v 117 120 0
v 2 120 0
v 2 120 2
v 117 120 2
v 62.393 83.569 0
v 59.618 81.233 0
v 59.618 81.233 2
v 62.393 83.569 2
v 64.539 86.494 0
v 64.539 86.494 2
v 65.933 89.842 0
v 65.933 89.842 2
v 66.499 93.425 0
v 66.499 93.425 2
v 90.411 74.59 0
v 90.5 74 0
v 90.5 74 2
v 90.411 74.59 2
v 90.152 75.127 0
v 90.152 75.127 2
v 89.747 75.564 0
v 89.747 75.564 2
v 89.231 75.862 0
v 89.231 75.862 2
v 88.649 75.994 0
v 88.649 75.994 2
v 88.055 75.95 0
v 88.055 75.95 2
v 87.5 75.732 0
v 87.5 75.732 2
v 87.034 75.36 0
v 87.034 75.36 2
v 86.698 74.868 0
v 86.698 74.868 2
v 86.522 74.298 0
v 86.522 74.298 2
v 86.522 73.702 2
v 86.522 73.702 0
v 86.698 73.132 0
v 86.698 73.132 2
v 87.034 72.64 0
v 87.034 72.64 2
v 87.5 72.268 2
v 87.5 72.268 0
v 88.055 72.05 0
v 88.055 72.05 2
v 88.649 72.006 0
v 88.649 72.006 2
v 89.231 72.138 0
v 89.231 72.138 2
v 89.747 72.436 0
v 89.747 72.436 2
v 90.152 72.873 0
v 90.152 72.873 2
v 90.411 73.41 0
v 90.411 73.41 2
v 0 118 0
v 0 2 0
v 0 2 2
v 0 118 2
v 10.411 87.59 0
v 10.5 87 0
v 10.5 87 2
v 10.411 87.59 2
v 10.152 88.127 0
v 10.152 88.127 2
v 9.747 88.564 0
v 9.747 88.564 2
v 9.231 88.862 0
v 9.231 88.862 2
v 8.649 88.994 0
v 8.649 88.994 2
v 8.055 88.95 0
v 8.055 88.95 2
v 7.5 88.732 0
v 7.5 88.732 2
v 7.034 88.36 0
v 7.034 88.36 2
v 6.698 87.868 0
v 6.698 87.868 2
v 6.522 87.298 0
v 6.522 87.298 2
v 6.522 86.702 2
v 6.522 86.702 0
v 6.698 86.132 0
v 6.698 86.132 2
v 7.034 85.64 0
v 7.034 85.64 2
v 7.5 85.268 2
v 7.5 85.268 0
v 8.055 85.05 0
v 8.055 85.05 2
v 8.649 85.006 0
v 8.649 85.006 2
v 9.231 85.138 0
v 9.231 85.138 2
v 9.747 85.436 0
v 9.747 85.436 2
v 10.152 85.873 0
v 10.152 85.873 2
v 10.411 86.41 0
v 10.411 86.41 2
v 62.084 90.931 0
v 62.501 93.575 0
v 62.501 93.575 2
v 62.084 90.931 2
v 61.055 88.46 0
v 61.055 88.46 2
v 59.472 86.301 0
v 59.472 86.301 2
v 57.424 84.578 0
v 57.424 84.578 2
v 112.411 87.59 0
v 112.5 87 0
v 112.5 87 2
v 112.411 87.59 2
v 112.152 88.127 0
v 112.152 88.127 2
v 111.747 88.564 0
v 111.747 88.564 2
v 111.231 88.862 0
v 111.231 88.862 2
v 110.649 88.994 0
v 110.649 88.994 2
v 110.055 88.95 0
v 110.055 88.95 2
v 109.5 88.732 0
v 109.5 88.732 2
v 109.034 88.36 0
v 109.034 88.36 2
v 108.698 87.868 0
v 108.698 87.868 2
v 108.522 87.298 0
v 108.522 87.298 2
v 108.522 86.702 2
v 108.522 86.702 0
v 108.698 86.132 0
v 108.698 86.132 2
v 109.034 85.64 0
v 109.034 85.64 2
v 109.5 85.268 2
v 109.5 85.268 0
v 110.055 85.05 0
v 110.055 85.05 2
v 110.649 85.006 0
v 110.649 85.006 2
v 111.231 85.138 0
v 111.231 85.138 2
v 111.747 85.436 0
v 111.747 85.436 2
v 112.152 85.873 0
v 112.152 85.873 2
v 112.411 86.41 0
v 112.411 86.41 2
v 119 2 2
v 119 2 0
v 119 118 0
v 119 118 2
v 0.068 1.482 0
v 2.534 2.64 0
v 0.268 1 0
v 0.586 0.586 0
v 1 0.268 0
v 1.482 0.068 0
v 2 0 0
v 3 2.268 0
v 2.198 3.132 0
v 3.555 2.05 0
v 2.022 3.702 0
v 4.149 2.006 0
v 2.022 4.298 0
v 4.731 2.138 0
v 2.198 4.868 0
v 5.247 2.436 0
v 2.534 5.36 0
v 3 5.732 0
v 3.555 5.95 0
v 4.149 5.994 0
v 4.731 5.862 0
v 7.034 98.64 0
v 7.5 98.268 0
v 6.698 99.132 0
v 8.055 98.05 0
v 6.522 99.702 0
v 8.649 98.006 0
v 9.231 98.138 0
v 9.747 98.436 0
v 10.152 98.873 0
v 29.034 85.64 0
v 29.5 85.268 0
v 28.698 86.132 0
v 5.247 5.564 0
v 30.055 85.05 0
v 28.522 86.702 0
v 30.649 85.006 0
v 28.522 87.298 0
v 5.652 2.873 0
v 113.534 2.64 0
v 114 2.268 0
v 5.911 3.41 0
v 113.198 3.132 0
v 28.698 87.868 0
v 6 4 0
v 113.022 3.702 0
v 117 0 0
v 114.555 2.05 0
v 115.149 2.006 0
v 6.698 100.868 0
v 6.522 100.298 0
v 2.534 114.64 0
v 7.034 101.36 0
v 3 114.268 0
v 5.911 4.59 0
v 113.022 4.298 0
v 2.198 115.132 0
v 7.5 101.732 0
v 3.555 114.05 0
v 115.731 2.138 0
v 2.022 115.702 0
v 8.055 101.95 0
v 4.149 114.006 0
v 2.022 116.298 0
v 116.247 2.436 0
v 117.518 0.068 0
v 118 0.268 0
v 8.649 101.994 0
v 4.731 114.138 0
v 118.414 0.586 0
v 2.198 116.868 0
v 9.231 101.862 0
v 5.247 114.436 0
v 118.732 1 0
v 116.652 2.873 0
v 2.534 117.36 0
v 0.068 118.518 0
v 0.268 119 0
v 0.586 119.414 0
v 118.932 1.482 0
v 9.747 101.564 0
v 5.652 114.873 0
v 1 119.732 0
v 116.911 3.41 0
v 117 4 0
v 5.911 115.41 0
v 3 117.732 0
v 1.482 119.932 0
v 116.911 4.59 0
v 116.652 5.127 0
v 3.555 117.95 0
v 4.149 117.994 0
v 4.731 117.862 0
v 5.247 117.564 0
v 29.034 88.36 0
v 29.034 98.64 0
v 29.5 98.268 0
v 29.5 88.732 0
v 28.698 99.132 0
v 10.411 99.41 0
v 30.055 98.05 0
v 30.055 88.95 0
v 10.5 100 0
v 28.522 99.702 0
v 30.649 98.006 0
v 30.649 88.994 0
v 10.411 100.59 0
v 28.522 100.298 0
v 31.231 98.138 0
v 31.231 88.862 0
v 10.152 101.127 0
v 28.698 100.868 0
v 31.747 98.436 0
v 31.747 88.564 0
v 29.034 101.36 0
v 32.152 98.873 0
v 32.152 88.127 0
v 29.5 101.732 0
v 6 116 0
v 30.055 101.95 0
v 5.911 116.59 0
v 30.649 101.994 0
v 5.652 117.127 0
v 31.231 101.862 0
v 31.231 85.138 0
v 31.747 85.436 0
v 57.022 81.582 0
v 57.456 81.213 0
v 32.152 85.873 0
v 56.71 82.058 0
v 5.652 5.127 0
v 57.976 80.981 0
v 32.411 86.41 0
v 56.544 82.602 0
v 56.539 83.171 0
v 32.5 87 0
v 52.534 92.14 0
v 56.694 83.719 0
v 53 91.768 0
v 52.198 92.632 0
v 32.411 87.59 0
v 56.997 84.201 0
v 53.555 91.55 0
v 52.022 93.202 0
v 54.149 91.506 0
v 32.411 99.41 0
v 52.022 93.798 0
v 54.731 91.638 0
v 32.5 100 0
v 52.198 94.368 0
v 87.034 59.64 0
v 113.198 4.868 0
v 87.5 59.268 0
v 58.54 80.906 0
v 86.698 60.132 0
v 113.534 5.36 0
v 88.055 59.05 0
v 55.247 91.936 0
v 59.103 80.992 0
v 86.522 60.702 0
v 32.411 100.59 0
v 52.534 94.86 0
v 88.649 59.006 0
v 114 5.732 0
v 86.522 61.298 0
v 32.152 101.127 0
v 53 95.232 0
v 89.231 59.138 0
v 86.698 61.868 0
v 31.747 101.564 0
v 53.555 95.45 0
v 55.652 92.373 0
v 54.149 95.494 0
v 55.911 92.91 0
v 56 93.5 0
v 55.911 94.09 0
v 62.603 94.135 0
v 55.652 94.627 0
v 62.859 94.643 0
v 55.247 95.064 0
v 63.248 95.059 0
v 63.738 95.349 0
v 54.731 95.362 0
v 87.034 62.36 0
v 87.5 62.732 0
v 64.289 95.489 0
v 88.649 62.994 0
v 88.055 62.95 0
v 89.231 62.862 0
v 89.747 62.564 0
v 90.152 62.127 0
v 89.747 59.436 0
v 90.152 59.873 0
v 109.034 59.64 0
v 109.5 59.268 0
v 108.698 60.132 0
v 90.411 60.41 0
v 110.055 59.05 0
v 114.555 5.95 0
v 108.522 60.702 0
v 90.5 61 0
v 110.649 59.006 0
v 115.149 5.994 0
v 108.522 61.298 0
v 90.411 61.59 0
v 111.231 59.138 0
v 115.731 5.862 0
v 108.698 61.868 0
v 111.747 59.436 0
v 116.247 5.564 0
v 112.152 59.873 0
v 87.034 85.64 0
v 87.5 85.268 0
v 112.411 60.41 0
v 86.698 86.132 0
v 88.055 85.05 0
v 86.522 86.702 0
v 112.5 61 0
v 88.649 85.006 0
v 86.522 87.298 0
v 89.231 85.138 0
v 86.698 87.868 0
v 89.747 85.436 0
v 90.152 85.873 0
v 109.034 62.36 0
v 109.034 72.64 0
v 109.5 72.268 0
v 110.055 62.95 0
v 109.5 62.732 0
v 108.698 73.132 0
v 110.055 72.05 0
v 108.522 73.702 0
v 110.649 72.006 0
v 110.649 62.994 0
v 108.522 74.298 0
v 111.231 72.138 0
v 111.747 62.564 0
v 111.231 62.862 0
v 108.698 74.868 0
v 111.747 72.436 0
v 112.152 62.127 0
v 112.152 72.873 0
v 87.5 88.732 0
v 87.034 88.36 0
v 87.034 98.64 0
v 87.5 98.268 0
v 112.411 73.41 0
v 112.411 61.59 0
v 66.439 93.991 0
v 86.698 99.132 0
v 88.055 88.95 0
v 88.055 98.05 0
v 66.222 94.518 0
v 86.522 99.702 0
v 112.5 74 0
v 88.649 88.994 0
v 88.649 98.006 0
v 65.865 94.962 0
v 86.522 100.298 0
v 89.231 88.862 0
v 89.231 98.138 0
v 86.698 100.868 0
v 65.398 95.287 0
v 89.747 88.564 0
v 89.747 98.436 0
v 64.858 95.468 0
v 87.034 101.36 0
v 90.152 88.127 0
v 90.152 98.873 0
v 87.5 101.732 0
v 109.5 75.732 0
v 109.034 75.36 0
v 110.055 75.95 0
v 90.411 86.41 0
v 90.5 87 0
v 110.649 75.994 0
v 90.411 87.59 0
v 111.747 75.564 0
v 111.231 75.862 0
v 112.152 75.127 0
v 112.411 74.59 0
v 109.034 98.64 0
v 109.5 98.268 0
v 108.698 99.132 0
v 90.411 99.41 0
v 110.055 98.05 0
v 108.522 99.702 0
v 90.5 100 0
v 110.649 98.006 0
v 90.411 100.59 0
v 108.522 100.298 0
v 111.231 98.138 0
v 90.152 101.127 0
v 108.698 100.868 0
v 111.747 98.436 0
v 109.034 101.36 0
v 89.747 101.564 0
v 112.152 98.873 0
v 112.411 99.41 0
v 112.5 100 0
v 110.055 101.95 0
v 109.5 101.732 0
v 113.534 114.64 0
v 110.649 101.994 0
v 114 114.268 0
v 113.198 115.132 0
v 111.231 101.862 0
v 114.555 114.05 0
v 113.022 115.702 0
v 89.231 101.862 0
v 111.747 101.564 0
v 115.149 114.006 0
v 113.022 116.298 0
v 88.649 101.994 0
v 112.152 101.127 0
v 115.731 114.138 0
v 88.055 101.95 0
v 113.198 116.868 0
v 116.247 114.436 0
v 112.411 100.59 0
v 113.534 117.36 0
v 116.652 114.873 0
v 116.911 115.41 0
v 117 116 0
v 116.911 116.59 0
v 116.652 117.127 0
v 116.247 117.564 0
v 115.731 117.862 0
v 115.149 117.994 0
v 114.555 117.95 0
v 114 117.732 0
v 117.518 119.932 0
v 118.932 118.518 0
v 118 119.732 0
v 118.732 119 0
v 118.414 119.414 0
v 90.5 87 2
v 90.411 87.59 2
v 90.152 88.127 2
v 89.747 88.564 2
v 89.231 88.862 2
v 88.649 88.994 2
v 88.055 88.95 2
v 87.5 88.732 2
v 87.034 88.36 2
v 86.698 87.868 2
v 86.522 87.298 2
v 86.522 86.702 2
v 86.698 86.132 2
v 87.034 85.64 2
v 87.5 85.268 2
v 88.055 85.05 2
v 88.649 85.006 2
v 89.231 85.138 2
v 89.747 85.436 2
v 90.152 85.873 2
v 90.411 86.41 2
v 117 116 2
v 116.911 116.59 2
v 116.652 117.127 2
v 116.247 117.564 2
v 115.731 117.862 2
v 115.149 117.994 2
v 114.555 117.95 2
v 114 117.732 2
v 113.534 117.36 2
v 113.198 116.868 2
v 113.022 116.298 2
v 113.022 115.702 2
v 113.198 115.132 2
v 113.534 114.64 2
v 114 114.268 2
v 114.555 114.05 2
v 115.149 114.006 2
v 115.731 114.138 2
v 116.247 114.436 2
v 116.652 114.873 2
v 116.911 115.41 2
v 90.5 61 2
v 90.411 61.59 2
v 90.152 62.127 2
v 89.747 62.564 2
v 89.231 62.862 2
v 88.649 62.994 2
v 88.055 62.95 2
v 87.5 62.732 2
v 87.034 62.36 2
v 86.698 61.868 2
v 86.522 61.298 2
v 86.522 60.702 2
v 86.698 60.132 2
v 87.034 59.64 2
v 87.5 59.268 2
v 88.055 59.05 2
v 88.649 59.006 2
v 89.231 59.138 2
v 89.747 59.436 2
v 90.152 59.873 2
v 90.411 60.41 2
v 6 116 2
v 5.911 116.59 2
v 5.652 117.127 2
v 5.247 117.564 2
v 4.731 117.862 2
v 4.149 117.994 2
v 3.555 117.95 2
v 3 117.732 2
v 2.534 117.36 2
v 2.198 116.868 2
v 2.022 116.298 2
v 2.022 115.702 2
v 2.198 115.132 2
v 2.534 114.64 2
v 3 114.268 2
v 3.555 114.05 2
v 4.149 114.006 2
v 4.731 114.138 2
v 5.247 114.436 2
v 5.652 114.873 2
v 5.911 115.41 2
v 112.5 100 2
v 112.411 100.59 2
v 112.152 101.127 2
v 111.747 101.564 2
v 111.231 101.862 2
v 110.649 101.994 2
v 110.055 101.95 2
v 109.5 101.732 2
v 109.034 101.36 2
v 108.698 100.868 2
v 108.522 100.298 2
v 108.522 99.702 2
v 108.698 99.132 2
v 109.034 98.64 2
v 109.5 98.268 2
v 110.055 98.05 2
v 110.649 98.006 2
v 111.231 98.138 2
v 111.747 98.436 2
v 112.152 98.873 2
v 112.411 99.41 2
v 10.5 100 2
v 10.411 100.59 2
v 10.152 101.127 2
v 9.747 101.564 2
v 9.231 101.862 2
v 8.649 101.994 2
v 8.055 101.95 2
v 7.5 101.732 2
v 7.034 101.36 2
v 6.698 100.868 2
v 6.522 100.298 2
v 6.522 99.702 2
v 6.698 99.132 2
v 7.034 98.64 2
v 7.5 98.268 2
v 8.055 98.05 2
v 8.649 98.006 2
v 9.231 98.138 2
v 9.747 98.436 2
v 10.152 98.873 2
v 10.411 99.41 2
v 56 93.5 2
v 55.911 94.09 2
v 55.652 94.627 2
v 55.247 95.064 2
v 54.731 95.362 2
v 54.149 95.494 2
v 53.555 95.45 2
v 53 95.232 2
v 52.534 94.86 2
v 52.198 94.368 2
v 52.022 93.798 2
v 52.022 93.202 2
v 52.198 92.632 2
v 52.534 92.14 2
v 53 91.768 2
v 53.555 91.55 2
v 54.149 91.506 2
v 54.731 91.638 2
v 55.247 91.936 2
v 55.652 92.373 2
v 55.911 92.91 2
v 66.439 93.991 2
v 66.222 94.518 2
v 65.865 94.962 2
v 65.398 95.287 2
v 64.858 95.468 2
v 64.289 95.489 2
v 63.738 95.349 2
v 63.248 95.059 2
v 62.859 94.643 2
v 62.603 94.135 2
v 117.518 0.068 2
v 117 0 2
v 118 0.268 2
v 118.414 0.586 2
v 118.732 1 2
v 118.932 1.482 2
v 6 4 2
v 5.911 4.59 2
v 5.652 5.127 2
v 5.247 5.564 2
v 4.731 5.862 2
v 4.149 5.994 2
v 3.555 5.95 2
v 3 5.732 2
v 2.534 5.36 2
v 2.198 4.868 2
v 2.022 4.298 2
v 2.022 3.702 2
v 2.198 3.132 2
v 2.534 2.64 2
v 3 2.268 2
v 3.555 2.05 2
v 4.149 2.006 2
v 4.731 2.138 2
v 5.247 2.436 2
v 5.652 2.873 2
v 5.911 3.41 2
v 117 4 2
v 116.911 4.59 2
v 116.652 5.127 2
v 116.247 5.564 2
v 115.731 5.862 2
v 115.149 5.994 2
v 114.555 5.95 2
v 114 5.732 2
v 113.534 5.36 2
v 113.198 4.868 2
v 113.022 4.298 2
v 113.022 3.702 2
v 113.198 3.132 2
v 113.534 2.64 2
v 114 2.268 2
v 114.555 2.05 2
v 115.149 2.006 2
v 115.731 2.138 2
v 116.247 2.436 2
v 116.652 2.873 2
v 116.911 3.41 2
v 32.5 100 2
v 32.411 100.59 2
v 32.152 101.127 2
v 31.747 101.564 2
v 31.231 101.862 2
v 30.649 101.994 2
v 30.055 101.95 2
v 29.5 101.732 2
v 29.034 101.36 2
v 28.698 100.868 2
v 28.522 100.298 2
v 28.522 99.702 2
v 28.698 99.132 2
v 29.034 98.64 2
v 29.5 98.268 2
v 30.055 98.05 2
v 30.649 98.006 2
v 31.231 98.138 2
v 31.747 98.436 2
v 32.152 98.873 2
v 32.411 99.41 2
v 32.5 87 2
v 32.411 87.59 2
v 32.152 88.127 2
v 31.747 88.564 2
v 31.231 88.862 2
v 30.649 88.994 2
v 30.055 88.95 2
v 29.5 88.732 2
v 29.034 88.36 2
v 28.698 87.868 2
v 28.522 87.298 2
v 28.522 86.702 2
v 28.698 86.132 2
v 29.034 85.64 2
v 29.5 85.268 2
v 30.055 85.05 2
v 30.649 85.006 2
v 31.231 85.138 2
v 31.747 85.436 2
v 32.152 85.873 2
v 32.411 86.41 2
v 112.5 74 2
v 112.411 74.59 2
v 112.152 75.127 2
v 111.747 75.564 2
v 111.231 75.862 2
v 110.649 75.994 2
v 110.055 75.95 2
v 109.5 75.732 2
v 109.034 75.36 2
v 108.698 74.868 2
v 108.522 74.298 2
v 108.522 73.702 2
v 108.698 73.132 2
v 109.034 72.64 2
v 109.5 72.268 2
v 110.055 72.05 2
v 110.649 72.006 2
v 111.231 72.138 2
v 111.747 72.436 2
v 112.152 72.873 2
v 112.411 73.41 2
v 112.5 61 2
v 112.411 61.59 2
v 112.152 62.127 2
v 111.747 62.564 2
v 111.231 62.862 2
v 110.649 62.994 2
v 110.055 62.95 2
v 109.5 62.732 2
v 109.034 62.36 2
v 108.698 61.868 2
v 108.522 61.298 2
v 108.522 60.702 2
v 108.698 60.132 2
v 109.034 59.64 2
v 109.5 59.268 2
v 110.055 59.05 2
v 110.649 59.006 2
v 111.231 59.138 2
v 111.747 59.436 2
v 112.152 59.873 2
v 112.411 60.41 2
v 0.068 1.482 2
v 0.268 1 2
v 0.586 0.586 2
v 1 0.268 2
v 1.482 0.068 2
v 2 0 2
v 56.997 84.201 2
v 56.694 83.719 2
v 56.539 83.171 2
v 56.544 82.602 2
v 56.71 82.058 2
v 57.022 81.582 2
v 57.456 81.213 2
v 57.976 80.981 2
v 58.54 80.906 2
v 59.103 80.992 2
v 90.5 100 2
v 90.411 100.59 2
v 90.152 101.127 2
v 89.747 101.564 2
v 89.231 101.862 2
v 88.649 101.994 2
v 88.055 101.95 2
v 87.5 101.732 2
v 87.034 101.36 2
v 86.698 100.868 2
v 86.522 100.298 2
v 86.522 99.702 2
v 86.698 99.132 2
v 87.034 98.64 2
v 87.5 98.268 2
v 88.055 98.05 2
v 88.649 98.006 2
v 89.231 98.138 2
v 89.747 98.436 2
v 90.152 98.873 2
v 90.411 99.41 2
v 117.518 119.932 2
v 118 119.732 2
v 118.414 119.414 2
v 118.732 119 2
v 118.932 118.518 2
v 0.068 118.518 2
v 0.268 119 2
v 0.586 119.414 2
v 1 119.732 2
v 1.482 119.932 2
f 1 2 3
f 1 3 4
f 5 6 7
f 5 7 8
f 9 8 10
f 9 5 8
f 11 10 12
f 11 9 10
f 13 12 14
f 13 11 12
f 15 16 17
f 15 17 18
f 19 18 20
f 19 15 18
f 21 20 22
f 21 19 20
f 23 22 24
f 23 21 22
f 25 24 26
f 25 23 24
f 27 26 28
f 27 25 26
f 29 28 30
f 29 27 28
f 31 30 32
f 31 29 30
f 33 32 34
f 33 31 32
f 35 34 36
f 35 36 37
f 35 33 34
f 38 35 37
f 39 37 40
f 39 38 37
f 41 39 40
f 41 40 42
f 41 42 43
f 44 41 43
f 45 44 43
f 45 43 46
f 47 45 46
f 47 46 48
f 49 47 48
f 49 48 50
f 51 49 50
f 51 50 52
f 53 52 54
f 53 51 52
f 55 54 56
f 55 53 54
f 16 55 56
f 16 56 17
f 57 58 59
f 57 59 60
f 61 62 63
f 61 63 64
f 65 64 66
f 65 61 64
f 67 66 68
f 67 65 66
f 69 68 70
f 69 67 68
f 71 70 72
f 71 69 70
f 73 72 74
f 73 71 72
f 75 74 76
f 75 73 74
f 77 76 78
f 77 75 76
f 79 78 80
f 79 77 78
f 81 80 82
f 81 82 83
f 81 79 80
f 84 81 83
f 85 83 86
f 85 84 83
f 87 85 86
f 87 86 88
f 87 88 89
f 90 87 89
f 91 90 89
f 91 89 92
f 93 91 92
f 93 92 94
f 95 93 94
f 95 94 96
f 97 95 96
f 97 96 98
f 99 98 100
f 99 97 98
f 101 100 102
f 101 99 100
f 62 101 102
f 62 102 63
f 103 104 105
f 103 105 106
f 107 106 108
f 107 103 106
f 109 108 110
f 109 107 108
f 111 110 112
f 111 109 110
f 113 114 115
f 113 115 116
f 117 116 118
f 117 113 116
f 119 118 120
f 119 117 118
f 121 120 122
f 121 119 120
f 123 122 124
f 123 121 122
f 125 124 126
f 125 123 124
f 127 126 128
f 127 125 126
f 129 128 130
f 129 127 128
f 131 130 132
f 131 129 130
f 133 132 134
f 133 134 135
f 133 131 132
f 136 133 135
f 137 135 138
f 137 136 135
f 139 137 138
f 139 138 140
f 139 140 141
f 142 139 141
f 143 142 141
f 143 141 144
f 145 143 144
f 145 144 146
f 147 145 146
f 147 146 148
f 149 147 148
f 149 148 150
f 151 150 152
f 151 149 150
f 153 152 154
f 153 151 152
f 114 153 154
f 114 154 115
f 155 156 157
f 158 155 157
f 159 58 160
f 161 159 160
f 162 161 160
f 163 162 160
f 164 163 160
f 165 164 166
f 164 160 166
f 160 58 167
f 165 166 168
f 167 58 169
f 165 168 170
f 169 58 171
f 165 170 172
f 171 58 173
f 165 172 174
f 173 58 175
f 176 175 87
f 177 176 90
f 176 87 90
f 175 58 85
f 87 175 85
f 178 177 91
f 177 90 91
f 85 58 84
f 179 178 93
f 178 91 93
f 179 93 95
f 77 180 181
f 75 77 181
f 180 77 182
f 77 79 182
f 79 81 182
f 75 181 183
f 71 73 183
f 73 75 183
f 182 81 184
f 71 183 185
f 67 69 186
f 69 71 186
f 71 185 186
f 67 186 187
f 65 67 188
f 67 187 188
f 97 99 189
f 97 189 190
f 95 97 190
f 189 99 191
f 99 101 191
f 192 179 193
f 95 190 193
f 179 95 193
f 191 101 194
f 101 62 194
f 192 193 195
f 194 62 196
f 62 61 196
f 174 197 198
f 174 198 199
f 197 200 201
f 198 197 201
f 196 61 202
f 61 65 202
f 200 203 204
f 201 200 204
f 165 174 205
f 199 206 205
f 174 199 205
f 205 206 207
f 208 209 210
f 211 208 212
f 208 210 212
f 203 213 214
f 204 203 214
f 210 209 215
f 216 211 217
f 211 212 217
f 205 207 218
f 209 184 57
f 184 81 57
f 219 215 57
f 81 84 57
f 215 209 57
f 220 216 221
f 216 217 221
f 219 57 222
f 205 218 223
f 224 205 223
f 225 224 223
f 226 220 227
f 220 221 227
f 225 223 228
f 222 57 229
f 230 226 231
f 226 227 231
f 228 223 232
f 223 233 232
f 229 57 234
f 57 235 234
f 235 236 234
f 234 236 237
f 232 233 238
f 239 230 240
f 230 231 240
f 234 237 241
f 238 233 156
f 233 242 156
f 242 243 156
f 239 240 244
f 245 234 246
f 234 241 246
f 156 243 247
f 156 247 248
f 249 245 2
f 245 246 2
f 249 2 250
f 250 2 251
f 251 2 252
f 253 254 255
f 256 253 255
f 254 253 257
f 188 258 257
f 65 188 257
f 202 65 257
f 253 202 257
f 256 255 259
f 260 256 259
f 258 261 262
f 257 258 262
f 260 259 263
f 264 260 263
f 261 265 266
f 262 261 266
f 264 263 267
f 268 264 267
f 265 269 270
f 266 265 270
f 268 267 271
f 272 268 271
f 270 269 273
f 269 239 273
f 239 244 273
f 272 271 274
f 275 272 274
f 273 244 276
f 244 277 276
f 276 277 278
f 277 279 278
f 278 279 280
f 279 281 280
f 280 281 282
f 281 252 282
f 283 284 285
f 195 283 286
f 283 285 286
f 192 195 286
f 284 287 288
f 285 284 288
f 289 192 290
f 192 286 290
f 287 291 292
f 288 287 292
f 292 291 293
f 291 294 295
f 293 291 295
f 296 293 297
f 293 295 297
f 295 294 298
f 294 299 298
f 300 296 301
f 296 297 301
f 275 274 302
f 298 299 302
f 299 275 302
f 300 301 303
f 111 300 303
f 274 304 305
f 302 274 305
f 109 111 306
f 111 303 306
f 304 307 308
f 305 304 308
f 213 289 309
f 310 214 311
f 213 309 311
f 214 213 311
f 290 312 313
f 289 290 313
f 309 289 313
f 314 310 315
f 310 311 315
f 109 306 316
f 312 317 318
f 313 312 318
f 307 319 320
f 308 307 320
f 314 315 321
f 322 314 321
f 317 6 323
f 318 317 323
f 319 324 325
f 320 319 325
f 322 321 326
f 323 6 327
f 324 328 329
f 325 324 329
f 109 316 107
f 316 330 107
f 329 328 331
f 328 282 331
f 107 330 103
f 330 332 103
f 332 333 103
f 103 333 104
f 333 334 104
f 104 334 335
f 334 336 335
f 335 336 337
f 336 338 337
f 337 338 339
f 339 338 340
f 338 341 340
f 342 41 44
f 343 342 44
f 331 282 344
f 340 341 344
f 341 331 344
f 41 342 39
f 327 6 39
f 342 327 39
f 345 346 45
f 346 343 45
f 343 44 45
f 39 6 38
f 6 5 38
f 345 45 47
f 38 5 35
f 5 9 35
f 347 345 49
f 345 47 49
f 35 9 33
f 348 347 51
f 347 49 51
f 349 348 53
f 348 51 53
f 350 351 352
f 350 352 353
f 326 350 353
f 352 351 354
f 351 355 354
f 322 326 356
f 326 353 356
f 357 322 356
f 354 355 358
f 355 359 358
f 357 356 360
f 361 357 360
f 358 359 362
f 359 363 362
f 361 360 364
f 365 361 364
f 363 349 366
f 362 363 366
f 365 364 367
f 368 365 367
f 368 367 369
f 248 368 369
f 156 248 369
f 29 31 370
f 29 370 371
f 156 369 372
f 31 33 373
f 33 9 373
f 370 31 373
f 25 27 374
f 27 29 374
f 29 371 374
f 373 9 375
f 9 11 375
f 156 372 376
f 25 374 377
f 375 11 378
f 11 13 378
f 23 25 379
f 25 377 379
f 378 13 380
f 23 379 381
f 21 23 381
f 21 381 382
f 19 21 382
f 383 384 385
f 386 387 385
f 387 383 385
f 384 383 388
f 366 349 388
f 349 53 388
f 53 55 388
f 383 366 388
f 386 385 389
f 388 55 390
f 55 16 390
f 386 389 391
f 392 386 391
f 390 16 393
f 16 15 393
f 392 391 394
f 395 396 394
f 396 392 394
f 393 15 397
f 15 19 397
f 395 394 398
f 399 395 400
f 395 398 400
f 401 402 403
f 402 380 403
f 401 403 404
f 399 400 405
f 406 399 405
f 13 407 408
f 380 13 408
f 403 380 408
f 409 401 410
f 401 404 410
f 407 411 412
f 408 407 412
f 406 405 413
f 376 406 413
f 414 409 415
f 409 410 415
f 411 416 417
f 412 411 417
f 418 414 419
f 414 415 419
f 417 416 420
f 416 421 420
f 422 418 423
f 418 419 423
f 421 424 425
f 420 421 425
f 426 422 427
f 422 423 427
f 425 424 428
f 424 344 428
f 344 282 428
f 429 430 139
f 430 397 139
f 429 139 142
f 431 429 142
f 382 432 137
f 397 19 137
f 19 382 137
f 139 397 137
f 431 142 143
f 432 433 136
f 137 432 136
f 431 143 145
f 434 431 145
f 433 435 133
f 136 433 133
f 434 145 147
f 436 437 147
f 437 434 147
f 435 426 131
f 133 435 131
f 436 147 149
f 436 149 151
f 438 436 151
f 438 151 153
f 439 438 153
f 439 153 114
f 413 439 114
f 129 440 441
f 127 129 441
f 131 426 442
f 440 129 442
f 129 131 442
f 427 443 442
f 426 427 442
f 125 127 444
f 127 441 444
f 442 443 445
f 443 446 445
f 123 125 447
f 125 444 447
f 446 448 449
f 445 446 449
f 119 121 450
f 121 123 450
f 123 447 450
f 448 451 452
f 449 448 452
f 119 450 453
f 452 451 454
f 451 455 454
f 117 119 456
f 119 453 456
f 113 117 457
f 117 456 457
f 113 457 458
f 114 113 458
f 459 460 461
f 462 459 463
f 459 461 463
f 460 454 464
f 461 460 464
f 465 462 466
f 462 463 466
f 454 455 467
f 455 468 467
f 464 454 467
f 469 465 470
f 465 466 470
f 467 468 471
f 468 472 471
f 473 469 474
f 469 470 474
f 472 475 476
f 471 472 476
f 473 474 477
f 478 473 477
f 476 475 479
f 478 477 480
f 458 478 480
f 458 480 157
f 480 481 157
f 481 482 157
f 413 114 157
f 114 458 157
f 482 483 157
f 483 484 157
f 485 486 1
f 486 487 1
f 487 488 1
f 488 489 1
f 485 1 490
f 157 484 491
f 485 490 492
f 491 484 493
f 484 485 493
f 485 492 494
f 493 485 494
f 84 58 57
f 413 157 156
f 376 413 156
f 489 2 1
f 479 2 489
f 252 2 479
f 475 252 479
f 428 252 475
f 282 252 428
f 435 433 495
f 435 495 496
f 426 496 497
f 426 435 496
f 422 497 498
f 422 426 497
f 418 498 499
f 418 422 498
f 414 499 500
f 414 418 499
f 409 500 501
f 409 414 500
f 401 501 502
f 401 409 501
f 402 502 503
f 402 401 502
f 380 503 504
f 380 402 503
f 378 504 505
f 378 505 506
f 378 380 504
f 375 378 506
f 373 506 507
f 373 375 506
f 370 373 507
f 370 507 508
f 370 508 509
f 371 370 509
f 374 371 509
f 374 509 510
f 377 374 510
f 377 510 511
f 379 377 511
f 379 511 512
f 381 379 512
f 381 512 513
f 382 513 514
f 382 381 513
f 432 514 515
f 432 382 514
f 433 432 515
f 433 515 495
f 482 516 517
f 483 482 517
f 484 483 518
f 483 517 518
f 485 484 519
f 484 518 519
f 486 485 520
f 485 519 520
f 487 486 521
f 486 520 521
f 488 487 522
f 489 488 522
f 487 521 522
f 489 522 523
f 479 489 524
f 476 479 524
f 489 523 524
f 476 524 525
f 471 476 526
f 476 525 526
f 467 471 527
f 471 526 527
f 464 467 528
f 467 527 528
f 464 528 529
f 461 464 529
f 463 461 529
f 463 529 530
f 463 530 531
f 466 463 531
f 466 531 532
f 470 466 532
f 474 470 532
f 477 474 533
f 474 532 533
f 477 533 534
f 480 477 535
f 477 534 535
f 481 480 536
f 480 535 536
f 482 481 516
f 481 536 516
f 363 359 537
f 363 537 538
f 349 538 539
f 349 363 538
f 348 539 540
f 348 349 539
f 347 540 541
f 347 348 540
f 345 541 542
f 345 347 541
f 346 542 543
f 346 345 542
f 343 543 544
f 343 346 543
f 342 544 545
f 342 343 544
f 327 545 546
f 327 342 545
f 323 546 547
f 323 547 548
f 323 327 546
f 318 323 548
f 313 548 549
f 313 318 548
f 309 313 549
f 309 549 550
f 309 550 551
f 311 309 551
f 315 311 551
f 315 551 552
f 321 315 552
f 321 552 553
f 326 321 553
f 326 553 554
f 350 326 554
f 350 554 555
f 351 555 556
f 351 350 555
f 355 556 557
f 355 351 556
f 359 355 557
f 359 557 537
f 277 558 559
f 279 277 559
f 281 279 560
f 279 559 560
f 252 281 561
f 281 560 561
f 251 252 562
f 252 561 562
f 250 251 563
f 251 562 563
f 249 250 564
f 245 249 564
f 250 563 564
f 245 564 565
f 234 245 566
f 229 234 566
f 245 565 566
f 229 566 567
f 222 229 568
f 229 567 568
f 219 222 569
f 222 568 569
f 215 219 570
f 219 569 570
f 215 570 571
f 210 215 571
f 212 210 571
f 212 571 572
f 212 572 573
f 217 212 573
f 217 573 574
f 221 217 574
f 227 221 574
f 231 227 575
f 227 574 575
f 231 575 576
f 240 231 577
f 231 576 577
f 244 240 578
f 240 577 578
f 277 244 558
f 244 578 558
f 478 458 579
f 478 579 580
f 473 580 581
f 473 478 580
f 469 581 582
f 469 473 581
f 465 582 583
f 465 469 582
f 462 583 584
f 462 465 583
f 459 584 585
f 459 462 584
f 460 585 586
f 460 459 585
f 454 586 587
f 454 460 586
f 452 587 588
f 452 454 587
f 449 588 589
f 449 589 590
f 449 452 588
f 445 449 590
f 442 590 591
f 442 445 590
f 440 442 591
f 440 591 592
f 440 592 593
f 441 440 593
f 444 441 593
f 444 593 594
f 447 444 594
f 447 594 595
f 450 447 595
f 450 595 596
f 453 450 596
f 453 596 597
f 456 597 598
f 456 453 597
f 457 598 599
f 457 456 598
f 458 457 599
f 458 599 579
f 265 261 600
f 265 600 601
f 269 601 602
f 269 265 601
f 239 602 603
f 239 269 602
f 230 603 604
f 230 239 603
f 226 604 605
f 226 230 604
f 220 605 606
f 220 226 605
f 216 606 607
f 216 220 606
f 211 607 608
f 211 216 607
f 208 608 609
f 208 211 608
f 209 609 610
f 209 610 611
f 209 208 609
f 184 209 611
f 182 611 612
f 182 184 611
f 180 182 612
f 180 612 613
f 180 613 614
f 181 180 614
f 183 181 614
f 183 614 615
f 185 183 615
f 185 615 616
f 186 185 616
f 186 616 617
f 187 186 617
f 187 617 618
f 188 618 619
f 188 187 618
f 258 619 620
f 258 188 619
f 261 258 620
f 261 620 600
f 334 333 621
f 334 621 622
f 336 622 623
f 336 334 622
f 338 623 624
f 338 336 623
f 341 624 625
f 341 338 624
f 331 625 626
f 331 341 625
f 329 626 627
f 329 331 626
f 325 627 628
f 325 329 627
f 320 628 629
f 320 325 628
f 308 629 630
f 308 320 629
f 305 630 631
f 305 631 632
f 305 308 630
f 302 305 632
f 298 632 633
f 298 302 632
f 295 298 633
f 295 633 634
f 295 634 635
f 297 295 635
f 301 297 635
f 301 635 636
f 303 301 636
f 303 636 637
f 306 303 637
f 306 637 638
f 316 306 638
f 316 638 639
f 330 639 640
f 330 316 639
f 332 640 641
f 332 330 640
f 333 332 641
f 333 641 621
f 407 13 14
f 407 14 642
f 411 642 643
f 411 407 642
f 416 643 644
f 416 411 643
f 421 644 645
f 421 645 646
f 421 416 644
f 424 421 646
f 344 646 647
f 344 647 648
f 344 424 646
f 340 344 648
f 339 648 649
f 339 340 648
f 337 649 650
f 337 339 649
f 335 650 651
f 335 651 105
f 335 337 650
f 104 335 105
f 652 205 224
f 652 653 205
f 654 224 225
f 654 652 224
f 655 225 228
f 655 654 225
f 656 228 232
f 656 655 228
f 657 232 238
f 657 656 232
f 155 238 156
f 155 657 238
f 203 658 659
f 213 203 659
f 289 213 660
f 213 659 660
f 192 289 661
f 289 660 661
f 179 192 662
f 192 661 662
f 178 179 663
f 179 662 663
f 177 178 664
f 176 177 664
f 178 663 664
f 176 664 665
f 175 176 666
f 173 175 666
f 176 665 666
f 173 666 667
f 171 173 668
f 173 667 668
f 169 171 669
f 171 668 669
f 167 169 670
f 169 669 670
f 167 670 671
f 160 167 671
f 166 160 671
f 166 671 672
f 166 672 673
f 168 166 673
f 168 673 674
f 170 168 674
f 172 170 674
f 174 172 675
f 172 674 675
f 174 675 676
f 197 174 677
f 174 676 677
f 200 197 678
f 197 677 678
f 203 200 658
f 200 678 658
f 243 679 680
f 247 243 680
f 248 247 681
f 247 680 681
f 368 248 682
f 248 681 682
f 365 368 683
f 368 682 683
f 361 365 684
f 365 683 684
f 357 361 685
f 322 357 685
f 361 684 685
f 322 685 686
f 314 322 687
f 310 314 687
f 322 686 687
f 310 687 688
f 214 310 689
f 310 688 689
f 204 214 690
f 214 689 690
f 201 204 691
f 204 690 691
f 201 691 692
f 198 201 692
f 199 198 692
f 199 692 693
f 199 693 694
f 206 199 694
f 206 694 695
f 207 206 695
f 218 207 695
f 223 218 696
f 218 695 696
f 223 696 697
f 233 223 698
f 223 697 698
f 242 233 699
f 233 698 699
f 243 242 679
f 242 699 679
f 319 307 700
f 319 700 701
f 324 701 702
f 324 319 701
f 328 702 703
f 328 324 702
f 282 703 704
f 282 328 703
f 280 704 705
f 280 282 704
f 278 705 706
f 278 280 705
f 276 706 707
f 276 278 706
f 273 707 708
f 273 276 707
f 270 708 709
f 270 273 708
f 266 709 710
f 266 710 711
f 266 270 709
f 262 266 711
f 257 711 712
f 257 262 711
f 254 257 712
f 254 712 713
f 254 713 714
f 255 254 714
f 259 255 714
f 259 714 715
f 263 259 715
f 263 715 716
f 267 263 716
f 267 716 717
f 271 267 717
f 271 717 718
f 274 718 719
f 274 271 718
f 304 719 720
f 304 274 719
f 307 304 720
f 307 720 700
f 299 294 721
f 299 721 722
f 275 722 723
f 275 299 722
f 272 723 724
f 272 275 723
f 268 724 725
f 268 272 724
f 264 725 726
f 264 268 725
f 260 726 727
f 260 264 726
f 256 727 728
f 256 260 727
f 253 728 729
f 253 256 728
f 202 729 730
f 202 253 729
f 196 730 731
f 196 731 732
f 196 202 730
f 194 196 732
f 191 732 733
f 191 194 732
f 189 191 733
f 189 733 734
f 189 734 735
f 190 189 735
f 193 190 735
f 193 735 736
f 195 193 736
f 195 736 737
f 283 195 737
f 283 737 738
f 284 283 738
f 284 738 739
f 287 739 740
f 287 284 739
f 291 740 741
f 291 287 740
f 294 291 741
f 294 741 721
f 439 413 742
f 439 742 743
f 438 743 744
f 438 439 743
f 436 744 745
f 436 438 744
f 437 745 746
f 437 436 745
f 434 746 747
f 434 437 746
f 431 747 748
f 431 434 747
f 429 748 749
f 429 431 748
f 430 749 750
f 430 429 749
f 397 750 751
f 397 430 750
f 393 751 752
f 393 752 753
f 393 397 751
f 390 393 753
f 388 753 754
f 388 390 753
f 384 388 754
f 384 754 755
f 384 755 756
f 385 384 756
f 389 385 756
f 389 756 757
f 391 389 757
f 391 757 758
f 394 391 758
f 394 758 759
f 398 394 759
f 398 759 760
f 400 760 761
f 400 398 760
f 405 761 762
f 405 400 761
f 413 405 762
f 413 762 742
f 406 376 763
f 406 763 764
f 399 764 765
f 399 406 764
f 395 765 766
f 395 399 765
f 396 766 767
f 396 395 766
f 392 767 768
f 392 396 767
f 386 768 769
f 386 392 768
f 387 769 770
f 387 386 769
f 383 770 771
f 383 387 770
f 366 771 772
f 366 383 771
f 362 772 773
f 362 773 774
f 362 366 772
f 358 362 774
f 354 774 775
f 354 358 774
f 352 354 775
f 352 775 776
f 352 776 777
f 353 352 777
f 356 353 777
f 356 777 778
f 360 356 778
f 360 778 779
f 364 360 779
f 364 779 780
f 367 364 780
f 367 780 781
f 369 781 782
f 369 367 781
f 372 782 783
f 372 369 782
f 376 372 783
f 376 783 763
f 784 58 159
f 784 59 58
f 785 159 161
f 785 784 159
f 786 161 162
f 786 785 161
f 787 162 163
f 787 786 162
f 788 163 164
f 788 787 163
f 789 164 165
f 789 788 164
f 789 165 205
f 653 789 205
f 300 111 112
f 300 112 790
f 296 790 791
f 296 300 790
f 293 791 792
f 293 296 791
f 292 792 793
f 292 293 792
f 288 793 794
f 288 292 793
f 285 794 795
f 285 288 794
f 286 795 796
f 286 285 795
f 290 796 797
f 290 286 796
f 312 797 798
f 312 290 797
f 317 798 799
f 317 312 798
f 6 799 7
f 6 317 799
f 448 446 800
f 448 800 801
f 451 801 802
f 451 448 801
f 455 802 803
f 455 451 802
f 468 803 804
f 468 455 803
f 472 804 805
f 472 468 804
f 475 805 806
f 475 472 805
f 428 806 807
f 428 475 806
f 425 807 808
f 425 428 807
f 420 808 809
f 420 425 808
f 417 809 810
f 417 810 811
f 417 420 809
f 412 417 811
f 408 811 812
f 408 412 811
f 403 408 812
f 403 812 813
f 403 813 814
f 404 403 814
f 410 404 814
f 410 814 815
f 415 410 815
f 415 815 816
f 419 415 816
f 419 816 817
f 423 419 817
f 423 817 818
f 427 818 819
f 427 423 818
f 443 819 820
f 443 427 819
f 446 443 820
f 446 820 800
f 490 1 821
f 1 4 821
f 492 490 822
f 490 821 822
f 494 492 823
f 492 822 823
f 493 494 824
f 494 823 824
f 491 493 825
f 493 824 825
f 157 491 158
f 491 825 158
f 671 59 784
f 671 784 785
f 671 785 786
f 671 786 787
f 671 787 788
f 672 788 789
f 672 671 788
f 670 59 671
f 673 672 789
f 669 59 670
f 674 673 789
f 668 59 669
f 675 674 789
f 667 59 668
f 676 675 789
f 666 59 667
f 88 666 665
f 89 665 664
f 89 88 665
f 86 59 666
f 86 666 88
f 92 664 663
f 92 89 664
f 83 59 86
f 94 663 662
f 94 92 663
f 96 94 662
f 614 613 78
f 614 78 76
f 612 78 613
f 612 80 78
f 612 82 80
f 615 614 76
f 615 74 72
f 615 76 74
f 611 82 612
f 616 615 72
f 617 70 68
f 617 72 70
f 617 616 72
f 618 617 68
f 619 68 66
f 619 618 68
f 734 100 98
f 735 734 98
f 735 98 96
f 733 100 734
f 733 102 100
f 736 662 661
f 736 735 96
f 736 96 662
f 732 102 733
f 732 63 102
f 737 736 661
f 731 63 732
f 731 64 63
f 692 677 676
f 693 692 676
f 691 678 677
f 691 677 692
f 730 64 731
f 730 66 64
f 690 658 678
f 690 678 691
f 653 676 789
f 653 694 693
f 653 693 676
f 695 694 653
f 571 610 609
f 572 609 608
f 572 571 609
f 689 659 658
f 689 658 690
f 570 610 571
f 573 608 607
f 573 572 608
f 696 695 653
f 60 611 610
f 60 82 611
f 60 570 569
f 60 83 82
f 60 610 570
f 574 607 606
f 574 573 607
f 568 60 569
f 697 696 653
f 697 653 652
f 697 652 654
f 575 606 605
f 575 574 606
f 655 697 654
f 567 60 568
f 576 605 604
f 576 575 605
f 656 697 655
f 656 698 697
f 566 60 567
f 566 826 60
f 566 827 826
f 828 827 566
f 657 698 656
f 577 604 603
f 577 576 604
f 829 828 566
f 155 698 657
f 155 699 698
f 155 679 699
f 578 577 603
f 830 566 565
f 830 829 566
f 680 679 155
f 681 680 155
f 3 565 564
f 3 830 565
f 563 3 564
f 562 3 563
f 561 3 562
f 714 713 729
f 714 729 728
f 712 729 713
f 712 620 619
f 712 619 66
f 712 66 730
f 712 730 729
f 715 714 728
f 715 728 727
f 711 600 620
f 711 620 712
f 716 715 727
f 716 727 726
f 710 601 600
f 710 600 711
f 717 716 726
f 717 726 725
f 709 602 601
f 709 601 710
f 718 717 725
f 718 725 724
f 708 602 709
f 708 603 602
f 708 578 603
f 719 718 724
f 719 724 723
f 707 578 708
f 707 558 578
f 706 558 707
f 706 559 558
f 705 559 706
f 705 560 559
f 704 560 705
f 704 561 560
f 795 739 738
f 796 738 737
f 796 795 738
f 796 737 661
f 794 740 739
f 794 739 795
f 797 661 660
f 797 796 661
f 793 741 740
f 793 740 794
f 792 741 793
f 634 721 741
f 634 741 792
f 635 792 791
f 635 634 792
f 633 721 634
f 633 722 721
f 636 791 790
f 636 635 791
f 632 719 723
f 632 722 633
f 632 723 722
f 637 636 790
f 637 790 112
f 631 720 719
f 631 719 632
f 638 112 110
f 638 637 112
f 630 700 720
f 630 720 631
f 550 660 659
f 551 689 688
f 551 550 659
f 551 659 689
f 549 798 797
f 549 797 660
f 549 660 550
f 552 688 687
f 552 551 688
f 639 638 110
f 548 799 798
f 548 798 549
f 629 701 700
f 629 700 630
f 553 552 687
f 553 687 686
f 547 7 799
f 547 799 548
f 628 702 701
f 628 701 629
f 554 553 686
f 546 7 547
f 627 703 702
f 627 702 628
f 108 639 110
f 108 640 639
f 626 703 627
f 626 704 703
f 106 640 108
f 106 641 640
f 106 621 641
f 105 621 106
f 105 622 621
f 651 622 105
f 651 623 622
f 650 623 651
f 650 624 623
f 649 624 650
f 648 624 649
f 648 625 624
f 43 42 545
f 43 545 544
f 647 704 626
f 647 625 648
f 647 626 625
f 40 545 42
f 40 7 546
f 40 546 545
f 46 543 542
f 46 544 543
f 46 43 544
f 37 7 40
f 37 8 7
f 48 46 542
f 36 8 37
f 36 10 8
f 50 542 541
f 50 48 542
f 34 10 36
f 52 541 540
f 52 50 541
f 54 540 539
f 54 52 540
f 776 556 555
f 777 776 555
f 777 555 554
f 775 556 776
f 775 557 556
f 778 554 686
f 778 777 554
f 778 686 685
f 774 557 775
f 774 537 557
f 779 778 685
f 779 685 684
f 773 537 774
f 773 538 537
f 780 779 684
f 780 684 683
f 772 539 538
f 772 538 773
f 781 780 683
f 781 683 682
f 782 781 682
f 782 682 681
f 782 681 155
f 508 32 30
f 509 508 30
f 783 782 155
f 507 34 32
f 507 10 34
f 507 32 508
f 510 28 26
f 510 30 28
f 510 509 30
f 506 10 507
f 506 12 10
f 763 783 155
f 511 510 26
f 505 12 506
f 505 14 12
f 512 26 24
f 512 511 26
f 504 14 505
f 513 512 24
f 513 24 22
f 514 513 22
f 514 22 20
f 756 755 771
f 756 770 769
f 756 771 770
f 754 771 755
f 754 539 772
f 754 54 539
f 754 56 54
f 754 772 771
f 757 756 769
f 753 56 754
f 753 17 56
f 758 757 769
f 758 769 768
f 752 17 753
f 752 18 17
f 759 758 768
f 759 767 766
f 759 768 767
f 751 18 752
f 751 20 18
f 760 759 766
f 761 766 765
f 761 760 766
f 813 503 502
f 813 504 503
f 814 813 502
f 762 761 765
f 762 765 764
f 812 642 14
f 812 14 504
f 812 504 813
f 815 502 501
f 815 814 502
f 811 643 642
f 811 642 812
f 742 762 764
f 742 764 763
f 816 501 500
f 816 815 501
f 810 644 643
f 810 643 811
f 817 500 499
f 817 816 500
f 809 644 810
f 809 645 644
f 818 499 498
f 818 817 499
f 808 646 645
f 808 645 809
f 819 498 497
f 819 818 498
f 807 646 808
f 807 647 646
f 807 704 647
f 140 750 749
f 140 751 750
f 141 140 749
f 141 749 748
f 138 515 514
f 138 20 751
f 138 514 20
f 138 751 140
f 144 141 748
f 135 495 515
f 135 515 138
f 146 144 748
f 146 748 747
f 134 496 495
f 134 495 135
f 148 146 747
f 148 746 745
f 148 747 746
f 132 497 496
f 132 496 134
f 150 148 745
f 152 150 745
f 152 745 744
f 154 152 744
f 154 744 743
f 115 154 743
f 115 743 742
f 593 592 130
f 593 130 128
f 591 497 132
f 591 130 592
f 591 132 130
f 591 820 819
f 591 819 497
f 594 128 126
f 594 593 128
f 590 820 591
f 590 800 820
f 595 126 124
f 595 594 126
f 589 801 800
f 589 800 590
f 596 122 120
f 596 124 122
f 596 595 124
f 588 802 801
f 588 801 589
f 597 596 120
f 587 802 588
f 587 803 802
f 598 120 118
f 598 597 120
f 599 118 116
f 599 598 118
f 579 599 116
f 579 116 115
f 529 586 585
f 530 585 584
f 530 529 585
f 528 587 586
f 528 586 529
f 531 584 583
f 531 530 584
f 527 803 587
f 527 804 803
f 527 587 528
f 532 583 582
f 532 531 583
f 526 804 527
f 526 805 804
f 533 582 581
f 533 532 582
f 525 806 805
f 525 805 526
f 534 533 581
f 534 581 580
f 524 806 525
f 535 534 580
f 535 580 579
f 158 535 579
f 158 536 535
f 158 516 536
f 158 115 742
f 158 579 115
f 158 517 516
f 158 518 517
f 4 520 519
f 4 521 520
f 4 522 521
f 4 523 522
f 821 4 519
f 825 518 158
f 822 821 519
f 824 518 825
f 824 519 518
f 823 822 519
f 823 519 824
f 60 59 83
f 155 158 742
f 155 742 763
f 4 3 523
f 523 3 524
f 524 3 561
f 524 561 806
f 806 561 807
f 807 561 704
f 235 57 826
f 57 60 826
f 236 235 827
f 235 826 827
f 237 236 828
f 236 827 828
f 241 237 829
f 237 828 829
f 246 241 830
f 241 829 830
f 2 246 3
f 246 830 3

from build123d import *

# Parameters (mm, degrees)
SKETCH_2_W          = 119
SKETCH_2_H          = 120
EXTRUDE_1_DEPTH     = 2
SKETCH_6_R          = 2
CUT_EXTRUDE_3_DEPTH = 2
CUT_EXTRUDE_5_DEPTH = 2
FILLET_1_R          = 2
SKETCH_9_R          = 2
CUT_EXTRUDE_6_DEPTH = 2


with BuildPart() as part:
    # 草图2 → 凸台-拉伸1 (new body)
    with BuildSketch(Plane.XY):
        with Locations((59.5, 60)):
            Rectangle(SKETCH_2_W, SKETCH_2_H)
    extrude(amount=EXTRUDE_1_DEPTH)

    # 草图6 → 切除-拉伸3 (cut)
    with BuildSketch(Plane.XY):
        with Locations((8.5, 100)):
            Circle(SKETCH_6_R)
        with Locations((30.5, 100)):
            Circle(SKETCH_6_R)
        with Locations((8.5, 87)):
            Circle(SKETCH_6_R)
        with Locations((30.5, 87)):
            Circle(SKETCH_6_R)
        with Locations((54, 93.5)):
            Circle(SKETCH_6_R)
        with Locations((88.5, 100)):
            Circle(SKETCH_6_R)
        with Locations((88.5, 87)):
            Circle(SKETCH_6_R)
        with Locations((110.5, 100)):
            Circle(SKETCH_6_R)
        with Locations((110.5, 87)):
            Circle(SKETCH_6_R)
        with Locations((88.5, 74)):
            Circle(SKETCH_6_R)
        with Locations((88.5, 61)):
            Circle(SKETCH_6_R)
        with Locations((110.5, 74)):
            Circle(SKETCH_6_R)
        with Locations((110.5, 61)):
            Circle(SKETCH_6_R)
    extrude(amount=CUT_EXTRUDE_3_DEPTH, mode=Mode.SUBTRACT)

    # 草图7 → 切除-拉伸5 (cut)
    with BuildSketch(Plane.XY):
        with BuildLine():
            ThreePointArc((59.618141264, 81.233145737), (64.538696872, 86.493844671), (66.498605851, 93.425336399))
            ThreePointArc((66.498605851, 93.425336399), (64.574663601, 95.498605851), (62.501394149, 93.574663601))
            ThreePointArc((62.501394149, 93.574663601), (61.055127678, 88.459740312), (57.424125079, 84.577737339))
            ThreePointArc((57.424125079, 84.577737339), (56.848837371, 81.808433446), (59.618141264, 81.233145737))
        make_face()
    extrude(amount=CUT_EXTRUDE_5_DEPTH, mode=Mode.SUBTRACT)

    # 圆角1
    fillet_1_edges = [part.edges().sort_by_distance(p)[0] for p in [
        (0, 0, 1),
        (119, 0, 1),
        (119, 120, 1),
        (0, 120, 1),
    ]]
    fillet(fillet_1_edges, radius=FILLET_1_R)

    # 草图9 → 切除-拉伸6 (cut)
    with BuildSketch(Plane.XY.offset(2)):
        with Locations((4, 116)):
            Circle(SKETCH_9_R)
        with Locations((115, 116)):
            Circle(SKETCH_9_R)
        with Locations((4, 4)):
            Circle(SKETCH_9_R)
        with Locations((115, 4)):
            Circle(SKETCH_9_R)
    extrude(amount=-CUT_EXTRUDE_6_DEPTH, mode=Mode.SUBTRACT)


solid = part.part
